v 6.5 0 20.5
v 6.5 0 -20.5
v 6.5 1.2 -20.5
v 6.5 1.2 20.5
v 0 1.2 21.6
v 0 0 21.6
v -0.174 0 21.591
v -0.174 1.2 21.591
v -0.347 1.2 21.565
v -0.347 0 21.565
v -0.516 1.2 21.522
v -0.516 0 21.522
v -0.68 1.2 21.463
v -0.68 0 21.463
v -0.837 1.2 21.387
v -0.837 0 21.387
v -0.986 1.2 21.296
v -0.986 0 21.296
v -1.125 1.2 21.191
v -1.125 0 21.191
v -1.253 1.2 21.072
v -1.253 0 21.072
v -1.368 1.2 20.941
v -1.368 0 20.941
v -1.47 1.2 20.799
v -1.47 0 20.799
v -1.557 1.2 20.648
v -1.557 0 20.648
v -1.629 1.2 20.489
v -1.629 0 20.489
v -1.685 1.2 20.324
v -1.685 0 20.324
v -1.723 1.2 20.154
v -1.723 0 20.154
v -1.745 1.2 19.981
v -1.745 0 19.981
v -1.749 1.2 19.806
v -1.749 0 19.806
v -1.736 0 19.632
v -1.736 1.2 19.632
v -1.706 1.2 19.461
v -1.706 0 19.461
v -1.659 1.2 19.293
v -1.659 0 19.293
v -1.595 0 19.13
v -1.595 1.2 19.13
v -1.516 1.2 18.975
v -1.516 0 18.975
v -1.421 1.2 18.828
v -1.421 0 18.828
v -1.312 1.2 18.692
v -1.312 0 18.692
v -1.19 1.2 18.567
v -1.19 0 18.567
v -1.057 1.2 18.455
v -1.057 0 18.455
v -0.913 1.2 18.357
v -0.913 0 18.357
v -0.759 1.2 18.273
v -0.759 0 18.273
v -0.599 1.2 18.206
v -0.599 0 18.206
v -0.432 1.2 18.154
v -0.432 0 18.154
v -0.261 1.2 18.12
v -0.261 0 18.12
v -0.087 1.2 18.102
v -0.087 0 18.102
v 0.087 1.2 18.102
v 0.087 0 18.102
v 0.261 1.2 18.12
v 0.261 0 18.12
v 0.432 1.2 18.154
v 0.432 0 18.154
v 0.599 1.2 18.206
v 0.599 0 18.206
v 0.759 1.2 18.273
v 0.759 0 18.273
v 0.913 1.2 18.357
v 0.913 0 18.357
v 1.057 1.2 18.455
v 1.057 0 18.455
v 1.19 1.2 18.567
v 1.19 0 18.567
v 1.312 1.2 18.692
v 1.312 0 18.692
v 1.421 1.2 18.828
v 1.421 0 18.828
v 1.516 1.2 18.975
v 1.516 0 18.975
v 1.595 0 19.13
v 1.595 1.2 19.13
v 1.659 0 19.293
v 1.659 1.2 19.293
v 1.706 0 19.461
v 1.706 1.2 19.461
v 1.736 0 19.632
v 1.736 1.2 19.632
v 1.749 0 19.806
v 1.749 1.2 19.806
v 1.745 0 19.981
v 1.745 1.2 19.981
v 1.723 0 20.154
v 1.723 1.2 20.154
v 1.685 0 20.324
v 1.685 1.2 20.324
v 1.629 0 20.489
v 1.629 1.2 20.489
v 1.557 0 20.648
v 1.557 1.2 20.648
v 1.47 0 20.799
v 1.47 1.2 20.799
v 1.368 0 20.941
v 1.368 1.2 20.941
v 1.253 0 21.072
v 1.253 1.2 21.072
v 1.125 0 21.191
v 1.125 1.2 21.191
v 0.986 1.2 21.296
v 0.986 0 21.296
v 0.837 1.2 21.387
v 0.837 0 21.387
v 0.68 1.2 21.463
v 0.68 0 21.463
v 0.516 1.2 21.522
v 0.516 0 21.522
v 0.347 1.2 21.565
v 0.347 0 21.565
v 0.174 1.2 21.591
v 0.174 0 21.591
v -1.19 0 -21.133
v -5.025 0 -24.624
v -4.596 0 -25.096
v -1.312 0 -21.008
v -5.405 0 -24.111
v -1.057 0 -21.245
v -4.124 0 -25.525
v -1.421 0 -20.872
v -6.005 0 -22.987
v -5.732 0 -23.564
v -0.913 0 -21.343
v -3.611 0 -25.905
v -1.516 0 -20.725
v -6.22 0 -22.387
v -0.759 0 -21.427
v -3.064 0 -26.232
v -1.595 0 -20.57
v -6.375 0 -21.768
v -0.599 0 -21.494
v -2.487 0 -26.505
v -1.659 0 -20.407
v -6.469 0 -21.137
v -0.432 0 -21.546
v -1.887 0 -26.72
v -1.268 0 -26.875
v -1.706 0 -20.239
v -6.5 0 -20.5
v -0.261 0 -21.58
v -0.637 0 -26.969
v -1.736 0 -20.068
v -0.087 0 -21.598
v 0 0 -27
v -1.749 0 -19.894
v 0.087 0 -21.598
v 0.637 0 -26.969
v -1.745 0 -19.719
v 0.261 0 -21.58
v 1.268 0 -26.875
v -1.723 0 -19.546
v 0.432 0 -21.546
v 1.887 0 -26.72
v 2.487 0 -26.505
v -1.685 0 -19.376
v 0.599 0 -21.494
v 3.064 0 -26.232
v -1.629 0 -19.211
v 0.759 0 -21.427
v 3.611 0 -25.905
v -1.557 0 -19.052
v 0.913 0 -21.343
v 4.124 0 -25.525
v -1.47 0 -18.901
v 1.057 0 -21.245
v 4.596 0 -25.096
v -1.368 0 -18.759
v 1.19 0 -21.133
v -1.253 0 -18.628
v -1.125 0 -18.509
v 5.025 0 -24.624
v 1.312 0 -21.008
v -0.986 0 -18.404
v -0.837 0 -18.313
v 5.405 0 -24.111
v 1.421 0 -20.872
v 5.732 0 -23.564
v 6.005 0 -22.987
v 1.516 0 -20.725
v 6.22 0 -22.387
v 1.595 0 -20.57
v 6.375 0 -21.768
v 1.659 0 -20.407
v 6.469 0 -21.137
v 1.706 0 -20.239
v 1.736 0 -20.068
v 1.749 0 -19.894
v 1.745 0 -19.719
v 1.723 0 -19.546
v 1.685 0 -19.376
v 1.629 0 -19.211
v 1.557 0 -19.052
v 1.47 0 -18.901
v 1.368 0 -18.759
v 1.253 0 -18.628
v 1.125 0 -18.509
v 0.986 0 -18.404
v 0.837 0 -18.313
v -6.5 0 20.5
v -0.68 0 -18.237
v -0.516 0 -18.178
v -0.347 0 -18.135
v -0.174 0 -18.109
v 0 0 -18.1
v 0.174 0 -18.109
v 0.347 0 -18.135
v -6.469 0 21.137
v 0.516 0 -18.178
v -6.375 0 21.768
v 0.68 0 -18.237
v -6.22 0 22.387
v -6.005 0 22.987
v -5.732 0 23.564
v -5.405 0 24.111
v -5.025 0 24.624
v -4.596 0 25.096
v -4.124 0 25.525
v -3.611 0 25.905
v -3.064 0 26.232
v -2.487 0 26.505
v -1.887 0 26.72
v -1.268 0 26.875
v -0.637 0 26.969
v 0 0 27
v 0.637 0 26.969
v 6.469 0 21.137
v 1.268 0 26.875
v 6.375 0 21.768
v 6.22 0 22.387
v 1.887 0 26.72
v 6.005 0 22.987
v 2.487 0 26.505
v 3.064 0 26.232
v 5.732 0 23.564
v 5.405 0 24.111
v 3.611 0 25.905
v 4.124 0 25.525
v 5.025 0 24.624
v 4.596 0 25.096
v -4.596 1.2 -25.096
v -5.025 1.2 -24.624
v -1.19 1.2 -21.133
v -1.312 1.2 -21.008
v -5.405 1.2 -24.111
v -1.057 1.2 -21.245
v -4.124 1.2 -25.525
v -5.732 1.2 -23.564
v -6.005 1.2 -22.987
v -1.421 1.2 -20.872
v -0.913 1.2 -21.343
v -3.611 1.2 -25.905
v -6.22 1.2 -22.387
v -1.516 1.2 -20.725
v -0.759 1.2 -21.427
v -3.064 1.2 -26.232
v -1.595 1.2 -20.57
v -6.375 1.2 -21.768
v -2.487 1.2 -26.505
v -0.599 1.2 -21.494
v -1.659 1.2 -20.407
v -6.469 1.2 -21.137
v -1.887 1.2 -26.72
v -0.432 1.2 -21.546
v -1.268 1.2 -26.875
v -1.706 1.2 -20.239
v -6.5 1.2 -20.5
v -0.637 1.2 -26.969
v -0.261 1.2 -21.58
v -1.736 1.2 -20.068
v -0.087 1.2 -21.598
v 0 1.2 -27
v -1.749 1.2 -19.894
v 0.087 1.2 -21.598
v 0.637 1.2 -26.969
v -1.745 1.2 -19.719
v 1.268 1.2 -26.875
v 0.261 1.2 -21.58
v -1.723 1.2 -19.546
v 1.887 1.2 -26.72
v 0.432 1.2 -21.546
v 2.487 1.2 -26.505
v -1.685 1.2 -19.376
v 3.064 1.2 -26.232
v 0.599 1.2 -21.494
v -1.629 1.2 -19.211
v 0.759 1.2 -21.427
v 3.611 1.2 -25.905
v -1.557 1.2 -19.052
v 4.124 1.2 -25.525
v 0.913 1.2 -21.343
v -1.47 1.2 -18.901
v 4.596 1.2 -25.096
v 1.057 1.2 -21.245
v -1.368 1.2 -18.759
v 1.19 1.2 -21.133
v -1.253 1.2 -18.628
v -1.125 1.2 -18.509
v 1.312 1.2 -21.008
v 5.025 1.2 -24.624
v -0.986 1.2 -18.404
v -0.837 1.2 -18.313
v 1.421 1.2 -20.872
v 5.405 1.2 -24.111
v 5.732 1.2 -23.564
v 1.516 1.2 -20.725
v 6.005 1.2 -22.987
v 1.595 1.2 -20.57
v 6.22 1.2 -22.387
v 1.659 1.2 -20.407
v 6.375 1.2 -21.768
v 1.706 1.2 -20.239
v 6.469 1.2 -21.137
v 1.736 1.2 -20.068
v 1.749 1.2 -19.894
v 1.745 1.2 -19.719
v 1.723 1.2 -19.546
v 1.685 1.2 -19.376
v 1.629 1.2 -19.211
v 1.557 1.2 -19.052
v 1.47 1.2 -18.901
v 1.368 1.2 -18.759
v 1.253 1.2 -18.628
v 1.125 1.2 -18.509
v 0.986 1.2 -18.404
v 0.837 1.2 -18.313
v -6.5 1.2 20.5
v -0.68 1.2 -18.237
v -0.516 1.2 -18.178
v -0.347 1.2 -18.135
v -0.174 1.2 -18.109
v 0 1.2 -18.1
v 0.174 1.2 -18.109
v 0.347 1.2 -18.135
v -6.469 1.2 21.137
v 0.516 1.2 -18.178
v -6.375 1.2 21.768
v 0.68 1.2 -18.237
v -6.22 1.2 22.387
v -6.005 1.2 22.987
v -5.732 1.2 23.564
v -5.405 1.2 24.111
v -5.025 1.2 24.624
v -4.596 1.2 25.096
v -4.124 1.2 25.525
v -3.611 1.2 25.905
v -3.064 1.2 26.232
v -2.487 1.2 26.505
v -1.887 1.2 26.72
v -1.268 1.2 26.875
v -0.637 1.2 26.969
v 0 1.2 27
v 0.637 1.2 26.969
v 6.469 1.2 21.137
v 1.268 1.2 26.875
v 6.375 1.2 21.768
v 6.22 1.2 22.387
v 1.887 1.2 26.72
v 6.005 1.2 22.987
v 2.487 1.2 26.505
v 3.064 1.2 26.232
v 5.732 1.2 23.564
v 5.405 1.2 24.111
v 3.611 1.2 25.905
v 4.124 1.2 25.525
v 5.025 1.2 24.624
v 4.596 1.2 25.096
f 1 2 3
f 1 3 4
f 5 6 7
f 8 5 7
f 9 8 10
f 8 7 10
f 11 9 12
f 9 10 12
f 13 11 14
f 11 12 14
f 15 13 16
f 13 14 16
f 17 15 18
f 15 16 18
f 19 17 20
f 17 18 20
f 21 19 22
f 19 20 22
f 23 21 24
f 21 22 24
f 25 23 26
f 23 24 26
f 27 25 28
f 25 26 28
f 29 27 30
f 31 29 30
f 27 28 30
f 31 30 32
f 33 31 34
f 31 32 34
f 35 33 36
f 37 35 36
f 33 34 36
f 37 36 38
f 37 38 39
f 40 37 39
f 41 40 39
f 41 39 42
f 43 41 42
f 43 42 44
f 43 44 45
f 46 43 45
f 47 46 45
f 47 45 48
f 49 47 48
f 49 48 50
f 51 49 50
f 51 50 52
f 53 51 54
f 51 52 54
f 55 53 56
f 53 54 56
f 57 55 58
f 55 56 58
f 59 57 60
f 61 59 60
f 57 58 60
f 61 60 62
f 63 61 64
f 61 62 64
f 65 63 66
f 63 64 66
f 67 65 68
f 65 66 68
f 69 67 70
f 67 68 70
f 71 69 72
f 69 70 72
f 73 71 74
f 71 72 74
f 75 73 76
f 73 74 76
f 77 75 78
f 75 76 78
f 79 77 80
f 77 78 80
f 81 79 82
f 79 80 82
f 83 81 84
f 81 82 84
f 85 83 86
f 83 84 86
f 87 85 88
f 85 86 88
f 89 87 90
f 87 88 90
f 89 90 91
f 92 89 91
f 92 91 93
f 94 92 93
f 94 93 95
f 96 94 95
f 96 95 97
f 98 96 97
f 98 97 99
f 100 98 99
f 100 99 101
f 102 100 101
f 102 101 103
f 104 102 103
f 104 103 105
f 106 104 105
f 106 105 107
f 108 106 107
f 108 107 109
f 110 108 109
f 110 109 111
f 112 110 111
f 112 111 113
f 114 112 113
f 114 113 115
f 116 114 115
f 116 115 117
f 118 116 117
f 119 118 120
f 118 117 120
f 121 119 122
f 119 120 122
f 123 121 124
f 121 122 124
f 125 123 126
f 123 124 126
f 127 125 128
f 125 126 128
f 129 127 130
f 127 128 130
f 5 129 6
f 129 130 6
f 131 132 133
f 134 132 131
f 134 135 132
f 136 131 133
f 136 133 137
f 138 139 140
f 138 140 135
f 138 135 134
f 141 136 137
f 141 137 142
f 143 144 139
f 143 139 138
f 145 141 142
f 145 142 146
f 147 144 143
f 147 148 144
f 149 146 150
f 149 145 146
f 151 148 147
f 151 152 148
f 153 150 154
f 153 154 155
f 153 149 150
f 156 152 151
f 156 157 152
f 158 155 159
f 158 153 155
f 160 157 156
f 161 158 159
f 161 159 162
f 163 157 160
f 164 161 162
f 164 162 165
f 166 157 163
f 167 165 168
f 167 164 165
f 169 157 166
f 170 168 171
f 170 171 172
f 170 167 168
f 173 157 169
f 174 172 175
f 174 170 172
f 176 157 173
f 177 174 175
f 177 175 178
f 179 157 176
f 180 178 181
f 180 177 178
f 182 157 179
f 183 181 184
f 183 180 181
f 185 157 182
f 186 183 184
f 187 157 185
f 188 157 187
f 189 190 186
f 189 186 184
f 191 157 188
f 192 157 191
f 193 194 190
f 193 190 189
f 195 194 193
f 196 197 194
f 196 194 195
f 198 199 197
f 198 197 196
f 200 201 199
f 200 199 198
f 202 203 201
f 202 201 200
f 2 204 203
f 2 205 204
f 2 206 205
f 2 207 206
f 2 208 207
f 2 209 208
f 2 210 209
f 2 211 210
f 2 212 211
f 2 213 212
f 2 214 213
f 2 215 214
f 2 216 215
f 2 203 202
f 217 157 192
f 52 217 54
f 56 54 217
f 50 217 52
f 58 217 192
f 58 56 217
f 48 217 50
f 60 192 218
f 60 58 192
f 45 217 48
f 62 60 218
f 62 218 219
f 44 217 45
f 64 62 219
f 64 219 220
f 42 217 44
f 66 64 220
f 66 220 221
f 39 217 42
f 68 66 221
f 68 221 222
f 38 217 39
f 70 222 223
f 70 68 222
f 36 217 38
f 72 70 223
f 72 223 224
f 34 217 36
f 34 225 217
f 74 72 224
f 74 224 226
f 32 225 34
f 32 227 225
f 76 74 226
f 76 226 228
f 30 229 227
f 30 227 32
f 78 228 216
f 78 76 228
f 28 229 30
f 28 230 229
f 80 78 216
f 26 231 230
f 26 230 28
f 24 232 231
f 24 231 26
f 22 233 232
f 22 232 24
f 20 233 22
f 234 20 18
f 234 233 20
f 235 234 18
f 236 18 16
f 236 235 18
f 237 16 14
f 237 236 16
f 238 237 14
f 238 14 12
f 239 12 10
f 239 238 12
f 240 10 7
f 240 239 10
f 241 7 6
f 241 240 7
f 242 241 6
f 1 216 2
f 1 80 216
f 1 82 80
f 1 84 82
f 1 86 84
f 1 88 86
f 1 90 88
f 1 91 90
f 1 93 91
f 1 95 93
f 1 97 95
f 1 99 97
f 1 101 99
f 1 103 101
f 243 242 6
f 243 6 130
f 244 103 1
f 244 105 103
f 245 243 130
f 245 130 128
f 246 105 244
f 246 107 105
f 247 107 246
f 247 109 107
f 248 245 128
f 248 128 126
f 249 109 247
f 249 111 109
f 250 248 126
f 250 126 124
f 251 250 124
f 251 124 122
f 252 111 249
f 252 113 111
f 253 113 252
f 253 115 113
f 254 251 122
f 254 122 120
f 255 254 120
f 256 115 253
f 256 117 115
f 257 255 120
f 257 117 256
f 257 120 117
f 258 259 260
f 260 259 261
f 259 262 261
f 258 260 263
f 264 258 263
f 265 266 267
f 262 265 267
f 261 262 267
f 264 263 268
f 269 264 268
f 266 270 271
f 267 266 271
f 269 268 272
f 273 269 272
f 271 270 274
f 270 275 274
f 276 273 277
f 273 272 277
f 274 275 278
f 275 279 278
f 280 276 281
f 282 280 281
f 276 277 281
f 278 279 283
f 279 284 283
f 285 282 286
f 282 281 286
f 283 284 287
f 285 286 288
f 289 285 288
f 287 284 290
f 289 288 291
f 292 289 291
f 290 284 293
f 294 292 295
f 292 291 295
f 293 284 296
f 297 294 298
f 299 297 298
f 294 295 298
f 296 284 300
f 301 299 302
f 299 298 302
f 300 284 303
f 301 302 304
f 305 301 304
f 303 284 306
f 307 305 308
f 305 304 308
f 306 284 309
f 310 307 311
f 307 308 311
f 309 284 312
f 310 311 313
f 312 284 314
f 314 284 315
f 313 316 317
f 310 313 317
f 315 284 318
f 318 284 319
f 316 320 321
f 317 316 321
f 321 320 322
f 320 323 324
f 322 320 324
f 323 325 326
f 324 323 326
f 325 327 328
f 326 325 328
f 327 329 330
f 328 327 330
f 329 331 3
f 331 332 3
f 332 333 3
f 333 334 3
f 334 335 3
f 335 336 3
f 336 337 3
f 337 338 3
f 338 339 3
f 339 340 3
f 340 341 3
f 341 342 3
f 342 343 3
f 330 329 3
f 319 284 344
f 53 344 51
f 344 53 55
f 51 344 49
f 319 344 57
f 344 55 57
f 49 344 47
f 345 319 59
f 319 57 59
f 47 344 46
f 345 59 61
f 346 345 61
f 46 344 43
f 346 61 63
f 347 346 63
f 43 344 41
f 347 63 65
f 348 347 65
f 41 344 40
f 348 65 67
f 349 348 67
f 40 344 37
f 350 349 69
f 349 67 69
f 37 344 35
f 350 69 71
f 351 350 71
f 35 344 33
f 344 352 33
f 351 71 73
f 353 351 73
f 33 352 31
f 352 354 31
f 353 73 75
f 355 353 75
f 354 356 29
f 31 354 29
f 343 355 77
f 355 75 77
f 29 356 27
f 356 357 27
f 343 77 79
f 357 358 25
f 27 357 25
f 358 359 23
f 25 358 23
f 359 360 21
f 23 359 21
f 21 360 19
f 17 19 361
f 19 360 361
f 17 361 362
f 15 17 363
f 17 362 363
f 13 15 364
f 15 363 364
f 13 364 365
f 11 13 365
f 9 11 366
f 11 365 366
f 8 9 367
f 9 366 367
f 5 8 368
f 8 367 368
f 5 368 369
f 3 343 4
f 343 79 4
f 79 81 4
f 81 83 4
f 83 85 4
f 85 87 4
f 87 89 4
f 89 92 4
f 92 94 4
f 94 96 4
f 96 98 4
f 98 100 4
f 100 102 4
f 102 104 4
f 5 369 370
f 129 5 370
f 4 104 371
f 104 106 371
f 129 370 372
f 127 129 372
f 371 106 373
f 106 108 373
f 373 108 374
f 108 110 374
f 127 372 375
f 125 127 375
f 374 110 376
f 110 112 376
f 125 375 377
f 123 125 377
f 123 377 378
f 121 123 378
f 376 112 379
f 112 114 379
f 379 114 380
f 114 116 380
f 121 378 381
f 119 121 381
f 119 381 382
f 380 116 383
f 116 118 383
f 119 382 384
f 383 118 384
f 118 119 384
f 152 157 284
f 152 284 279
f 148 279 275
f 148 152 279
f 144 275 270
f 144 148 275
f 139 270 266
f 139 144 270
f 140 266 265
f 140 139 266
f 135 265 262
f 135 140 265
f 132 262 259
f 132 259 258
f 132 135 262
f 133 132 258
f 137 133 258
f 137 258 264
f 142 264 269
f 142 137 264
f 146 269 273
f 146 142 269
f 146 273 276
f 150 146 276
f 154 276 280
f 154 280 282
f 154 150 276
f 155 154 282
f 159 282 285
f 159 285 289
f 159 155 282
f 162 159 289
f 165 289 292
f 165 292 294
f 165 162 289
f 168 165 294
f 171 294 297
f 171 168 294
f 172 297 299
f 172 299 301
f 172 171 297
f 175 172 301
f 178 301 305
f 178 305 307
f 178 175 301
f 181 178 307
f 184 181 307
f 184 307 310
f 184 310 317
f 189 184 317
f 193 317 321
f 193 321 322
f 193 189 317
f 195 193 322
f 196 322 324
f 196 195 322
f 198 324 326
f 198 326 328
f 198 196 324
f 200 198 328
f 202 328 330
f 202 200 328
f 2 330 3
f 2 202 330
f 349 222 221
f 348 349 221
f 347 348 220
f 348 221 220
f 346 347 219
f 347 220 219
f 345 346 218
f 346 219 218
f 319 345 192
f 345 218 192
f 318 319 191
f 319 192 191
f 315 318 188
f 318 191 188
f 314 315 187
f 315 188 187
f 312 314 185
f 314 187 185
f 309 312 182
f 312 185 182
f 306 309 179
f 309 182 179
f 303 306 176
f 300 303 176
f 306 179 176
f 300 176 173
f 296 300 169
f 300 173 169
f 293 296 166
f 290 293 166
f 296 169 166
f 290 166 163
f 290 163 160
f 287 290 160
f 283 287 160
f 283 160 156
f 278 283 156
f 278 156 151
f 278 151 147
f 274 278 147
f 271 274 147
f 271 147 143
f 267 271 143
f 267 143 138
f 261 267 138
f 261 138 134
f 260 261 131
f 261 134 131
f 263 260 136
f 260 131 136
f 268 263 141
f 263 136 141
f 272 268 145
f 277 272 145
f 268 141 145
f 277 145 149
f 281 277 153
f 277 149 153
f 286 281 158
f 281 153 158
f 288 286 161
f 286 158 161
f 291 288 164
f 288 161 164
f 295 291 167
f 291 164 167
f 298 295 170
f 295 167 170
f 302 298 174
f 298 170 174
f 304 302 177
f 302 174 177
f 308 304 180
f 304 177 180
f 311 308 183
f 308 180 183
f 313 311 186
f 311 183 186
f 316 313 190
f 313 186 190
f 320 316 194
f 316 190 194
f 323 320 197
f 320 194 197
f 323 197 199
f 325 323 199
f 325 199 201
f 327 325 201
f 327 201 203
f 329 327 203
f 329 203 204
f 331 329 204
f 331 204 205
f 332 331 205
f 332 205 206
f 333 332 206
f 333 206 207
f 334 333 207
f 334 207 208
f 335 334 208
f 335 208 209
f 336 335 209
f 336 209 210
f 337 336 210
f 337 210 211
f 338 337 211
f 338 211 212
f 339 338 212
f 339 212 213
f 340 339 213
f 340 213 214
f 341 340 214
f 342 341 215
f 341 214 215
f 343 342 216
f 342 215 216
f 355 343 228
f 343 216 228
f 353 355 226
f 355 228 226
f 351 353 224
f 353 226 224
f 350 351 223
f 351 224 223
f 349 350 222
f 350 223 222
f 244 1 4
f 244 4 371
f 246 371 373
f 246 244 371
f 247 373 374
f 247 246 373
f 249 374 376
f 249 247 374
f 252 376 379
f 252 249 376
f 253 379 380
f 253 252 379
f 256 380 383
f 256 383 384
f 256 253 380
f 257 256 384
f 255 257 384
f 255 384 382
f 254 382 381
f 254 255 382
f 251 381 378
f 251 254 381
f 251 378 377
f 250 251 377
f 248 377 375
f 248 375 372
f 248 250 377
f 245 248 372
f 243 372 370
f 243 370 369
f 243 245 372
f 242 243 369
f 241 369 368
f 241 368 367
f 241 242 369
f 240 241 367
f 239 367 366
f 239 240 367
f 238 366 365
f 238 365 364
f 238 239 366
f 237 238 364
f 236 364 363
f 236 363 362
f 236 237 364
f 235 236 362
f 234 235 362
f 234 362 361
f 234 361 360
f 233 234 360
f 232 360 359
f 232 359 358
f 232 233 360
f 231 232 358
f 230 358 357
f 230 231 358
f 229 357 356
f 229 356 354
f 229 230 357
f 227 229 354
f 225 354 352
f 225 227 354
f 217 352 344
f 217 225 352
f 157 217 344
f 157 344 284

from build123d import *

# Parameters (mm, degrees)
SKETCH_1_R      = 1.75
EXTRUDE_1_DEPTH = 1.2


with BuildPart() as part:
    # 草图1 → 凸台-拉伸1 (new body)
    with BuildSketch(Plane.XZ):
        with BuildLine():
            Line((6.5, -20.5), (6.5, 20.5))
            ThreePointArc((6.5, 20.5), (0, 27), (-6.5, 20.5))
            Line((-6.5, 20.5), (-6.5, -20.5))
            ThreePointArc((-6.5, -20.5), (0, -27), (6.5, -20.5))
        make_face()
        with Locations(Location((0, 19.85, 0), (0, 0, 90))):
            Circle(SKETCH_1_R, mode=Mode.SUBTRACT)
        with Locations(Location((0, -19.85, 0), (0, 0, 90))):
            Circle(SKETCH_1_R, mode=Mode.SUBTRACT)
    extrude(amount=-EXTRUDE_1_DEPTH)


solid = part.part
